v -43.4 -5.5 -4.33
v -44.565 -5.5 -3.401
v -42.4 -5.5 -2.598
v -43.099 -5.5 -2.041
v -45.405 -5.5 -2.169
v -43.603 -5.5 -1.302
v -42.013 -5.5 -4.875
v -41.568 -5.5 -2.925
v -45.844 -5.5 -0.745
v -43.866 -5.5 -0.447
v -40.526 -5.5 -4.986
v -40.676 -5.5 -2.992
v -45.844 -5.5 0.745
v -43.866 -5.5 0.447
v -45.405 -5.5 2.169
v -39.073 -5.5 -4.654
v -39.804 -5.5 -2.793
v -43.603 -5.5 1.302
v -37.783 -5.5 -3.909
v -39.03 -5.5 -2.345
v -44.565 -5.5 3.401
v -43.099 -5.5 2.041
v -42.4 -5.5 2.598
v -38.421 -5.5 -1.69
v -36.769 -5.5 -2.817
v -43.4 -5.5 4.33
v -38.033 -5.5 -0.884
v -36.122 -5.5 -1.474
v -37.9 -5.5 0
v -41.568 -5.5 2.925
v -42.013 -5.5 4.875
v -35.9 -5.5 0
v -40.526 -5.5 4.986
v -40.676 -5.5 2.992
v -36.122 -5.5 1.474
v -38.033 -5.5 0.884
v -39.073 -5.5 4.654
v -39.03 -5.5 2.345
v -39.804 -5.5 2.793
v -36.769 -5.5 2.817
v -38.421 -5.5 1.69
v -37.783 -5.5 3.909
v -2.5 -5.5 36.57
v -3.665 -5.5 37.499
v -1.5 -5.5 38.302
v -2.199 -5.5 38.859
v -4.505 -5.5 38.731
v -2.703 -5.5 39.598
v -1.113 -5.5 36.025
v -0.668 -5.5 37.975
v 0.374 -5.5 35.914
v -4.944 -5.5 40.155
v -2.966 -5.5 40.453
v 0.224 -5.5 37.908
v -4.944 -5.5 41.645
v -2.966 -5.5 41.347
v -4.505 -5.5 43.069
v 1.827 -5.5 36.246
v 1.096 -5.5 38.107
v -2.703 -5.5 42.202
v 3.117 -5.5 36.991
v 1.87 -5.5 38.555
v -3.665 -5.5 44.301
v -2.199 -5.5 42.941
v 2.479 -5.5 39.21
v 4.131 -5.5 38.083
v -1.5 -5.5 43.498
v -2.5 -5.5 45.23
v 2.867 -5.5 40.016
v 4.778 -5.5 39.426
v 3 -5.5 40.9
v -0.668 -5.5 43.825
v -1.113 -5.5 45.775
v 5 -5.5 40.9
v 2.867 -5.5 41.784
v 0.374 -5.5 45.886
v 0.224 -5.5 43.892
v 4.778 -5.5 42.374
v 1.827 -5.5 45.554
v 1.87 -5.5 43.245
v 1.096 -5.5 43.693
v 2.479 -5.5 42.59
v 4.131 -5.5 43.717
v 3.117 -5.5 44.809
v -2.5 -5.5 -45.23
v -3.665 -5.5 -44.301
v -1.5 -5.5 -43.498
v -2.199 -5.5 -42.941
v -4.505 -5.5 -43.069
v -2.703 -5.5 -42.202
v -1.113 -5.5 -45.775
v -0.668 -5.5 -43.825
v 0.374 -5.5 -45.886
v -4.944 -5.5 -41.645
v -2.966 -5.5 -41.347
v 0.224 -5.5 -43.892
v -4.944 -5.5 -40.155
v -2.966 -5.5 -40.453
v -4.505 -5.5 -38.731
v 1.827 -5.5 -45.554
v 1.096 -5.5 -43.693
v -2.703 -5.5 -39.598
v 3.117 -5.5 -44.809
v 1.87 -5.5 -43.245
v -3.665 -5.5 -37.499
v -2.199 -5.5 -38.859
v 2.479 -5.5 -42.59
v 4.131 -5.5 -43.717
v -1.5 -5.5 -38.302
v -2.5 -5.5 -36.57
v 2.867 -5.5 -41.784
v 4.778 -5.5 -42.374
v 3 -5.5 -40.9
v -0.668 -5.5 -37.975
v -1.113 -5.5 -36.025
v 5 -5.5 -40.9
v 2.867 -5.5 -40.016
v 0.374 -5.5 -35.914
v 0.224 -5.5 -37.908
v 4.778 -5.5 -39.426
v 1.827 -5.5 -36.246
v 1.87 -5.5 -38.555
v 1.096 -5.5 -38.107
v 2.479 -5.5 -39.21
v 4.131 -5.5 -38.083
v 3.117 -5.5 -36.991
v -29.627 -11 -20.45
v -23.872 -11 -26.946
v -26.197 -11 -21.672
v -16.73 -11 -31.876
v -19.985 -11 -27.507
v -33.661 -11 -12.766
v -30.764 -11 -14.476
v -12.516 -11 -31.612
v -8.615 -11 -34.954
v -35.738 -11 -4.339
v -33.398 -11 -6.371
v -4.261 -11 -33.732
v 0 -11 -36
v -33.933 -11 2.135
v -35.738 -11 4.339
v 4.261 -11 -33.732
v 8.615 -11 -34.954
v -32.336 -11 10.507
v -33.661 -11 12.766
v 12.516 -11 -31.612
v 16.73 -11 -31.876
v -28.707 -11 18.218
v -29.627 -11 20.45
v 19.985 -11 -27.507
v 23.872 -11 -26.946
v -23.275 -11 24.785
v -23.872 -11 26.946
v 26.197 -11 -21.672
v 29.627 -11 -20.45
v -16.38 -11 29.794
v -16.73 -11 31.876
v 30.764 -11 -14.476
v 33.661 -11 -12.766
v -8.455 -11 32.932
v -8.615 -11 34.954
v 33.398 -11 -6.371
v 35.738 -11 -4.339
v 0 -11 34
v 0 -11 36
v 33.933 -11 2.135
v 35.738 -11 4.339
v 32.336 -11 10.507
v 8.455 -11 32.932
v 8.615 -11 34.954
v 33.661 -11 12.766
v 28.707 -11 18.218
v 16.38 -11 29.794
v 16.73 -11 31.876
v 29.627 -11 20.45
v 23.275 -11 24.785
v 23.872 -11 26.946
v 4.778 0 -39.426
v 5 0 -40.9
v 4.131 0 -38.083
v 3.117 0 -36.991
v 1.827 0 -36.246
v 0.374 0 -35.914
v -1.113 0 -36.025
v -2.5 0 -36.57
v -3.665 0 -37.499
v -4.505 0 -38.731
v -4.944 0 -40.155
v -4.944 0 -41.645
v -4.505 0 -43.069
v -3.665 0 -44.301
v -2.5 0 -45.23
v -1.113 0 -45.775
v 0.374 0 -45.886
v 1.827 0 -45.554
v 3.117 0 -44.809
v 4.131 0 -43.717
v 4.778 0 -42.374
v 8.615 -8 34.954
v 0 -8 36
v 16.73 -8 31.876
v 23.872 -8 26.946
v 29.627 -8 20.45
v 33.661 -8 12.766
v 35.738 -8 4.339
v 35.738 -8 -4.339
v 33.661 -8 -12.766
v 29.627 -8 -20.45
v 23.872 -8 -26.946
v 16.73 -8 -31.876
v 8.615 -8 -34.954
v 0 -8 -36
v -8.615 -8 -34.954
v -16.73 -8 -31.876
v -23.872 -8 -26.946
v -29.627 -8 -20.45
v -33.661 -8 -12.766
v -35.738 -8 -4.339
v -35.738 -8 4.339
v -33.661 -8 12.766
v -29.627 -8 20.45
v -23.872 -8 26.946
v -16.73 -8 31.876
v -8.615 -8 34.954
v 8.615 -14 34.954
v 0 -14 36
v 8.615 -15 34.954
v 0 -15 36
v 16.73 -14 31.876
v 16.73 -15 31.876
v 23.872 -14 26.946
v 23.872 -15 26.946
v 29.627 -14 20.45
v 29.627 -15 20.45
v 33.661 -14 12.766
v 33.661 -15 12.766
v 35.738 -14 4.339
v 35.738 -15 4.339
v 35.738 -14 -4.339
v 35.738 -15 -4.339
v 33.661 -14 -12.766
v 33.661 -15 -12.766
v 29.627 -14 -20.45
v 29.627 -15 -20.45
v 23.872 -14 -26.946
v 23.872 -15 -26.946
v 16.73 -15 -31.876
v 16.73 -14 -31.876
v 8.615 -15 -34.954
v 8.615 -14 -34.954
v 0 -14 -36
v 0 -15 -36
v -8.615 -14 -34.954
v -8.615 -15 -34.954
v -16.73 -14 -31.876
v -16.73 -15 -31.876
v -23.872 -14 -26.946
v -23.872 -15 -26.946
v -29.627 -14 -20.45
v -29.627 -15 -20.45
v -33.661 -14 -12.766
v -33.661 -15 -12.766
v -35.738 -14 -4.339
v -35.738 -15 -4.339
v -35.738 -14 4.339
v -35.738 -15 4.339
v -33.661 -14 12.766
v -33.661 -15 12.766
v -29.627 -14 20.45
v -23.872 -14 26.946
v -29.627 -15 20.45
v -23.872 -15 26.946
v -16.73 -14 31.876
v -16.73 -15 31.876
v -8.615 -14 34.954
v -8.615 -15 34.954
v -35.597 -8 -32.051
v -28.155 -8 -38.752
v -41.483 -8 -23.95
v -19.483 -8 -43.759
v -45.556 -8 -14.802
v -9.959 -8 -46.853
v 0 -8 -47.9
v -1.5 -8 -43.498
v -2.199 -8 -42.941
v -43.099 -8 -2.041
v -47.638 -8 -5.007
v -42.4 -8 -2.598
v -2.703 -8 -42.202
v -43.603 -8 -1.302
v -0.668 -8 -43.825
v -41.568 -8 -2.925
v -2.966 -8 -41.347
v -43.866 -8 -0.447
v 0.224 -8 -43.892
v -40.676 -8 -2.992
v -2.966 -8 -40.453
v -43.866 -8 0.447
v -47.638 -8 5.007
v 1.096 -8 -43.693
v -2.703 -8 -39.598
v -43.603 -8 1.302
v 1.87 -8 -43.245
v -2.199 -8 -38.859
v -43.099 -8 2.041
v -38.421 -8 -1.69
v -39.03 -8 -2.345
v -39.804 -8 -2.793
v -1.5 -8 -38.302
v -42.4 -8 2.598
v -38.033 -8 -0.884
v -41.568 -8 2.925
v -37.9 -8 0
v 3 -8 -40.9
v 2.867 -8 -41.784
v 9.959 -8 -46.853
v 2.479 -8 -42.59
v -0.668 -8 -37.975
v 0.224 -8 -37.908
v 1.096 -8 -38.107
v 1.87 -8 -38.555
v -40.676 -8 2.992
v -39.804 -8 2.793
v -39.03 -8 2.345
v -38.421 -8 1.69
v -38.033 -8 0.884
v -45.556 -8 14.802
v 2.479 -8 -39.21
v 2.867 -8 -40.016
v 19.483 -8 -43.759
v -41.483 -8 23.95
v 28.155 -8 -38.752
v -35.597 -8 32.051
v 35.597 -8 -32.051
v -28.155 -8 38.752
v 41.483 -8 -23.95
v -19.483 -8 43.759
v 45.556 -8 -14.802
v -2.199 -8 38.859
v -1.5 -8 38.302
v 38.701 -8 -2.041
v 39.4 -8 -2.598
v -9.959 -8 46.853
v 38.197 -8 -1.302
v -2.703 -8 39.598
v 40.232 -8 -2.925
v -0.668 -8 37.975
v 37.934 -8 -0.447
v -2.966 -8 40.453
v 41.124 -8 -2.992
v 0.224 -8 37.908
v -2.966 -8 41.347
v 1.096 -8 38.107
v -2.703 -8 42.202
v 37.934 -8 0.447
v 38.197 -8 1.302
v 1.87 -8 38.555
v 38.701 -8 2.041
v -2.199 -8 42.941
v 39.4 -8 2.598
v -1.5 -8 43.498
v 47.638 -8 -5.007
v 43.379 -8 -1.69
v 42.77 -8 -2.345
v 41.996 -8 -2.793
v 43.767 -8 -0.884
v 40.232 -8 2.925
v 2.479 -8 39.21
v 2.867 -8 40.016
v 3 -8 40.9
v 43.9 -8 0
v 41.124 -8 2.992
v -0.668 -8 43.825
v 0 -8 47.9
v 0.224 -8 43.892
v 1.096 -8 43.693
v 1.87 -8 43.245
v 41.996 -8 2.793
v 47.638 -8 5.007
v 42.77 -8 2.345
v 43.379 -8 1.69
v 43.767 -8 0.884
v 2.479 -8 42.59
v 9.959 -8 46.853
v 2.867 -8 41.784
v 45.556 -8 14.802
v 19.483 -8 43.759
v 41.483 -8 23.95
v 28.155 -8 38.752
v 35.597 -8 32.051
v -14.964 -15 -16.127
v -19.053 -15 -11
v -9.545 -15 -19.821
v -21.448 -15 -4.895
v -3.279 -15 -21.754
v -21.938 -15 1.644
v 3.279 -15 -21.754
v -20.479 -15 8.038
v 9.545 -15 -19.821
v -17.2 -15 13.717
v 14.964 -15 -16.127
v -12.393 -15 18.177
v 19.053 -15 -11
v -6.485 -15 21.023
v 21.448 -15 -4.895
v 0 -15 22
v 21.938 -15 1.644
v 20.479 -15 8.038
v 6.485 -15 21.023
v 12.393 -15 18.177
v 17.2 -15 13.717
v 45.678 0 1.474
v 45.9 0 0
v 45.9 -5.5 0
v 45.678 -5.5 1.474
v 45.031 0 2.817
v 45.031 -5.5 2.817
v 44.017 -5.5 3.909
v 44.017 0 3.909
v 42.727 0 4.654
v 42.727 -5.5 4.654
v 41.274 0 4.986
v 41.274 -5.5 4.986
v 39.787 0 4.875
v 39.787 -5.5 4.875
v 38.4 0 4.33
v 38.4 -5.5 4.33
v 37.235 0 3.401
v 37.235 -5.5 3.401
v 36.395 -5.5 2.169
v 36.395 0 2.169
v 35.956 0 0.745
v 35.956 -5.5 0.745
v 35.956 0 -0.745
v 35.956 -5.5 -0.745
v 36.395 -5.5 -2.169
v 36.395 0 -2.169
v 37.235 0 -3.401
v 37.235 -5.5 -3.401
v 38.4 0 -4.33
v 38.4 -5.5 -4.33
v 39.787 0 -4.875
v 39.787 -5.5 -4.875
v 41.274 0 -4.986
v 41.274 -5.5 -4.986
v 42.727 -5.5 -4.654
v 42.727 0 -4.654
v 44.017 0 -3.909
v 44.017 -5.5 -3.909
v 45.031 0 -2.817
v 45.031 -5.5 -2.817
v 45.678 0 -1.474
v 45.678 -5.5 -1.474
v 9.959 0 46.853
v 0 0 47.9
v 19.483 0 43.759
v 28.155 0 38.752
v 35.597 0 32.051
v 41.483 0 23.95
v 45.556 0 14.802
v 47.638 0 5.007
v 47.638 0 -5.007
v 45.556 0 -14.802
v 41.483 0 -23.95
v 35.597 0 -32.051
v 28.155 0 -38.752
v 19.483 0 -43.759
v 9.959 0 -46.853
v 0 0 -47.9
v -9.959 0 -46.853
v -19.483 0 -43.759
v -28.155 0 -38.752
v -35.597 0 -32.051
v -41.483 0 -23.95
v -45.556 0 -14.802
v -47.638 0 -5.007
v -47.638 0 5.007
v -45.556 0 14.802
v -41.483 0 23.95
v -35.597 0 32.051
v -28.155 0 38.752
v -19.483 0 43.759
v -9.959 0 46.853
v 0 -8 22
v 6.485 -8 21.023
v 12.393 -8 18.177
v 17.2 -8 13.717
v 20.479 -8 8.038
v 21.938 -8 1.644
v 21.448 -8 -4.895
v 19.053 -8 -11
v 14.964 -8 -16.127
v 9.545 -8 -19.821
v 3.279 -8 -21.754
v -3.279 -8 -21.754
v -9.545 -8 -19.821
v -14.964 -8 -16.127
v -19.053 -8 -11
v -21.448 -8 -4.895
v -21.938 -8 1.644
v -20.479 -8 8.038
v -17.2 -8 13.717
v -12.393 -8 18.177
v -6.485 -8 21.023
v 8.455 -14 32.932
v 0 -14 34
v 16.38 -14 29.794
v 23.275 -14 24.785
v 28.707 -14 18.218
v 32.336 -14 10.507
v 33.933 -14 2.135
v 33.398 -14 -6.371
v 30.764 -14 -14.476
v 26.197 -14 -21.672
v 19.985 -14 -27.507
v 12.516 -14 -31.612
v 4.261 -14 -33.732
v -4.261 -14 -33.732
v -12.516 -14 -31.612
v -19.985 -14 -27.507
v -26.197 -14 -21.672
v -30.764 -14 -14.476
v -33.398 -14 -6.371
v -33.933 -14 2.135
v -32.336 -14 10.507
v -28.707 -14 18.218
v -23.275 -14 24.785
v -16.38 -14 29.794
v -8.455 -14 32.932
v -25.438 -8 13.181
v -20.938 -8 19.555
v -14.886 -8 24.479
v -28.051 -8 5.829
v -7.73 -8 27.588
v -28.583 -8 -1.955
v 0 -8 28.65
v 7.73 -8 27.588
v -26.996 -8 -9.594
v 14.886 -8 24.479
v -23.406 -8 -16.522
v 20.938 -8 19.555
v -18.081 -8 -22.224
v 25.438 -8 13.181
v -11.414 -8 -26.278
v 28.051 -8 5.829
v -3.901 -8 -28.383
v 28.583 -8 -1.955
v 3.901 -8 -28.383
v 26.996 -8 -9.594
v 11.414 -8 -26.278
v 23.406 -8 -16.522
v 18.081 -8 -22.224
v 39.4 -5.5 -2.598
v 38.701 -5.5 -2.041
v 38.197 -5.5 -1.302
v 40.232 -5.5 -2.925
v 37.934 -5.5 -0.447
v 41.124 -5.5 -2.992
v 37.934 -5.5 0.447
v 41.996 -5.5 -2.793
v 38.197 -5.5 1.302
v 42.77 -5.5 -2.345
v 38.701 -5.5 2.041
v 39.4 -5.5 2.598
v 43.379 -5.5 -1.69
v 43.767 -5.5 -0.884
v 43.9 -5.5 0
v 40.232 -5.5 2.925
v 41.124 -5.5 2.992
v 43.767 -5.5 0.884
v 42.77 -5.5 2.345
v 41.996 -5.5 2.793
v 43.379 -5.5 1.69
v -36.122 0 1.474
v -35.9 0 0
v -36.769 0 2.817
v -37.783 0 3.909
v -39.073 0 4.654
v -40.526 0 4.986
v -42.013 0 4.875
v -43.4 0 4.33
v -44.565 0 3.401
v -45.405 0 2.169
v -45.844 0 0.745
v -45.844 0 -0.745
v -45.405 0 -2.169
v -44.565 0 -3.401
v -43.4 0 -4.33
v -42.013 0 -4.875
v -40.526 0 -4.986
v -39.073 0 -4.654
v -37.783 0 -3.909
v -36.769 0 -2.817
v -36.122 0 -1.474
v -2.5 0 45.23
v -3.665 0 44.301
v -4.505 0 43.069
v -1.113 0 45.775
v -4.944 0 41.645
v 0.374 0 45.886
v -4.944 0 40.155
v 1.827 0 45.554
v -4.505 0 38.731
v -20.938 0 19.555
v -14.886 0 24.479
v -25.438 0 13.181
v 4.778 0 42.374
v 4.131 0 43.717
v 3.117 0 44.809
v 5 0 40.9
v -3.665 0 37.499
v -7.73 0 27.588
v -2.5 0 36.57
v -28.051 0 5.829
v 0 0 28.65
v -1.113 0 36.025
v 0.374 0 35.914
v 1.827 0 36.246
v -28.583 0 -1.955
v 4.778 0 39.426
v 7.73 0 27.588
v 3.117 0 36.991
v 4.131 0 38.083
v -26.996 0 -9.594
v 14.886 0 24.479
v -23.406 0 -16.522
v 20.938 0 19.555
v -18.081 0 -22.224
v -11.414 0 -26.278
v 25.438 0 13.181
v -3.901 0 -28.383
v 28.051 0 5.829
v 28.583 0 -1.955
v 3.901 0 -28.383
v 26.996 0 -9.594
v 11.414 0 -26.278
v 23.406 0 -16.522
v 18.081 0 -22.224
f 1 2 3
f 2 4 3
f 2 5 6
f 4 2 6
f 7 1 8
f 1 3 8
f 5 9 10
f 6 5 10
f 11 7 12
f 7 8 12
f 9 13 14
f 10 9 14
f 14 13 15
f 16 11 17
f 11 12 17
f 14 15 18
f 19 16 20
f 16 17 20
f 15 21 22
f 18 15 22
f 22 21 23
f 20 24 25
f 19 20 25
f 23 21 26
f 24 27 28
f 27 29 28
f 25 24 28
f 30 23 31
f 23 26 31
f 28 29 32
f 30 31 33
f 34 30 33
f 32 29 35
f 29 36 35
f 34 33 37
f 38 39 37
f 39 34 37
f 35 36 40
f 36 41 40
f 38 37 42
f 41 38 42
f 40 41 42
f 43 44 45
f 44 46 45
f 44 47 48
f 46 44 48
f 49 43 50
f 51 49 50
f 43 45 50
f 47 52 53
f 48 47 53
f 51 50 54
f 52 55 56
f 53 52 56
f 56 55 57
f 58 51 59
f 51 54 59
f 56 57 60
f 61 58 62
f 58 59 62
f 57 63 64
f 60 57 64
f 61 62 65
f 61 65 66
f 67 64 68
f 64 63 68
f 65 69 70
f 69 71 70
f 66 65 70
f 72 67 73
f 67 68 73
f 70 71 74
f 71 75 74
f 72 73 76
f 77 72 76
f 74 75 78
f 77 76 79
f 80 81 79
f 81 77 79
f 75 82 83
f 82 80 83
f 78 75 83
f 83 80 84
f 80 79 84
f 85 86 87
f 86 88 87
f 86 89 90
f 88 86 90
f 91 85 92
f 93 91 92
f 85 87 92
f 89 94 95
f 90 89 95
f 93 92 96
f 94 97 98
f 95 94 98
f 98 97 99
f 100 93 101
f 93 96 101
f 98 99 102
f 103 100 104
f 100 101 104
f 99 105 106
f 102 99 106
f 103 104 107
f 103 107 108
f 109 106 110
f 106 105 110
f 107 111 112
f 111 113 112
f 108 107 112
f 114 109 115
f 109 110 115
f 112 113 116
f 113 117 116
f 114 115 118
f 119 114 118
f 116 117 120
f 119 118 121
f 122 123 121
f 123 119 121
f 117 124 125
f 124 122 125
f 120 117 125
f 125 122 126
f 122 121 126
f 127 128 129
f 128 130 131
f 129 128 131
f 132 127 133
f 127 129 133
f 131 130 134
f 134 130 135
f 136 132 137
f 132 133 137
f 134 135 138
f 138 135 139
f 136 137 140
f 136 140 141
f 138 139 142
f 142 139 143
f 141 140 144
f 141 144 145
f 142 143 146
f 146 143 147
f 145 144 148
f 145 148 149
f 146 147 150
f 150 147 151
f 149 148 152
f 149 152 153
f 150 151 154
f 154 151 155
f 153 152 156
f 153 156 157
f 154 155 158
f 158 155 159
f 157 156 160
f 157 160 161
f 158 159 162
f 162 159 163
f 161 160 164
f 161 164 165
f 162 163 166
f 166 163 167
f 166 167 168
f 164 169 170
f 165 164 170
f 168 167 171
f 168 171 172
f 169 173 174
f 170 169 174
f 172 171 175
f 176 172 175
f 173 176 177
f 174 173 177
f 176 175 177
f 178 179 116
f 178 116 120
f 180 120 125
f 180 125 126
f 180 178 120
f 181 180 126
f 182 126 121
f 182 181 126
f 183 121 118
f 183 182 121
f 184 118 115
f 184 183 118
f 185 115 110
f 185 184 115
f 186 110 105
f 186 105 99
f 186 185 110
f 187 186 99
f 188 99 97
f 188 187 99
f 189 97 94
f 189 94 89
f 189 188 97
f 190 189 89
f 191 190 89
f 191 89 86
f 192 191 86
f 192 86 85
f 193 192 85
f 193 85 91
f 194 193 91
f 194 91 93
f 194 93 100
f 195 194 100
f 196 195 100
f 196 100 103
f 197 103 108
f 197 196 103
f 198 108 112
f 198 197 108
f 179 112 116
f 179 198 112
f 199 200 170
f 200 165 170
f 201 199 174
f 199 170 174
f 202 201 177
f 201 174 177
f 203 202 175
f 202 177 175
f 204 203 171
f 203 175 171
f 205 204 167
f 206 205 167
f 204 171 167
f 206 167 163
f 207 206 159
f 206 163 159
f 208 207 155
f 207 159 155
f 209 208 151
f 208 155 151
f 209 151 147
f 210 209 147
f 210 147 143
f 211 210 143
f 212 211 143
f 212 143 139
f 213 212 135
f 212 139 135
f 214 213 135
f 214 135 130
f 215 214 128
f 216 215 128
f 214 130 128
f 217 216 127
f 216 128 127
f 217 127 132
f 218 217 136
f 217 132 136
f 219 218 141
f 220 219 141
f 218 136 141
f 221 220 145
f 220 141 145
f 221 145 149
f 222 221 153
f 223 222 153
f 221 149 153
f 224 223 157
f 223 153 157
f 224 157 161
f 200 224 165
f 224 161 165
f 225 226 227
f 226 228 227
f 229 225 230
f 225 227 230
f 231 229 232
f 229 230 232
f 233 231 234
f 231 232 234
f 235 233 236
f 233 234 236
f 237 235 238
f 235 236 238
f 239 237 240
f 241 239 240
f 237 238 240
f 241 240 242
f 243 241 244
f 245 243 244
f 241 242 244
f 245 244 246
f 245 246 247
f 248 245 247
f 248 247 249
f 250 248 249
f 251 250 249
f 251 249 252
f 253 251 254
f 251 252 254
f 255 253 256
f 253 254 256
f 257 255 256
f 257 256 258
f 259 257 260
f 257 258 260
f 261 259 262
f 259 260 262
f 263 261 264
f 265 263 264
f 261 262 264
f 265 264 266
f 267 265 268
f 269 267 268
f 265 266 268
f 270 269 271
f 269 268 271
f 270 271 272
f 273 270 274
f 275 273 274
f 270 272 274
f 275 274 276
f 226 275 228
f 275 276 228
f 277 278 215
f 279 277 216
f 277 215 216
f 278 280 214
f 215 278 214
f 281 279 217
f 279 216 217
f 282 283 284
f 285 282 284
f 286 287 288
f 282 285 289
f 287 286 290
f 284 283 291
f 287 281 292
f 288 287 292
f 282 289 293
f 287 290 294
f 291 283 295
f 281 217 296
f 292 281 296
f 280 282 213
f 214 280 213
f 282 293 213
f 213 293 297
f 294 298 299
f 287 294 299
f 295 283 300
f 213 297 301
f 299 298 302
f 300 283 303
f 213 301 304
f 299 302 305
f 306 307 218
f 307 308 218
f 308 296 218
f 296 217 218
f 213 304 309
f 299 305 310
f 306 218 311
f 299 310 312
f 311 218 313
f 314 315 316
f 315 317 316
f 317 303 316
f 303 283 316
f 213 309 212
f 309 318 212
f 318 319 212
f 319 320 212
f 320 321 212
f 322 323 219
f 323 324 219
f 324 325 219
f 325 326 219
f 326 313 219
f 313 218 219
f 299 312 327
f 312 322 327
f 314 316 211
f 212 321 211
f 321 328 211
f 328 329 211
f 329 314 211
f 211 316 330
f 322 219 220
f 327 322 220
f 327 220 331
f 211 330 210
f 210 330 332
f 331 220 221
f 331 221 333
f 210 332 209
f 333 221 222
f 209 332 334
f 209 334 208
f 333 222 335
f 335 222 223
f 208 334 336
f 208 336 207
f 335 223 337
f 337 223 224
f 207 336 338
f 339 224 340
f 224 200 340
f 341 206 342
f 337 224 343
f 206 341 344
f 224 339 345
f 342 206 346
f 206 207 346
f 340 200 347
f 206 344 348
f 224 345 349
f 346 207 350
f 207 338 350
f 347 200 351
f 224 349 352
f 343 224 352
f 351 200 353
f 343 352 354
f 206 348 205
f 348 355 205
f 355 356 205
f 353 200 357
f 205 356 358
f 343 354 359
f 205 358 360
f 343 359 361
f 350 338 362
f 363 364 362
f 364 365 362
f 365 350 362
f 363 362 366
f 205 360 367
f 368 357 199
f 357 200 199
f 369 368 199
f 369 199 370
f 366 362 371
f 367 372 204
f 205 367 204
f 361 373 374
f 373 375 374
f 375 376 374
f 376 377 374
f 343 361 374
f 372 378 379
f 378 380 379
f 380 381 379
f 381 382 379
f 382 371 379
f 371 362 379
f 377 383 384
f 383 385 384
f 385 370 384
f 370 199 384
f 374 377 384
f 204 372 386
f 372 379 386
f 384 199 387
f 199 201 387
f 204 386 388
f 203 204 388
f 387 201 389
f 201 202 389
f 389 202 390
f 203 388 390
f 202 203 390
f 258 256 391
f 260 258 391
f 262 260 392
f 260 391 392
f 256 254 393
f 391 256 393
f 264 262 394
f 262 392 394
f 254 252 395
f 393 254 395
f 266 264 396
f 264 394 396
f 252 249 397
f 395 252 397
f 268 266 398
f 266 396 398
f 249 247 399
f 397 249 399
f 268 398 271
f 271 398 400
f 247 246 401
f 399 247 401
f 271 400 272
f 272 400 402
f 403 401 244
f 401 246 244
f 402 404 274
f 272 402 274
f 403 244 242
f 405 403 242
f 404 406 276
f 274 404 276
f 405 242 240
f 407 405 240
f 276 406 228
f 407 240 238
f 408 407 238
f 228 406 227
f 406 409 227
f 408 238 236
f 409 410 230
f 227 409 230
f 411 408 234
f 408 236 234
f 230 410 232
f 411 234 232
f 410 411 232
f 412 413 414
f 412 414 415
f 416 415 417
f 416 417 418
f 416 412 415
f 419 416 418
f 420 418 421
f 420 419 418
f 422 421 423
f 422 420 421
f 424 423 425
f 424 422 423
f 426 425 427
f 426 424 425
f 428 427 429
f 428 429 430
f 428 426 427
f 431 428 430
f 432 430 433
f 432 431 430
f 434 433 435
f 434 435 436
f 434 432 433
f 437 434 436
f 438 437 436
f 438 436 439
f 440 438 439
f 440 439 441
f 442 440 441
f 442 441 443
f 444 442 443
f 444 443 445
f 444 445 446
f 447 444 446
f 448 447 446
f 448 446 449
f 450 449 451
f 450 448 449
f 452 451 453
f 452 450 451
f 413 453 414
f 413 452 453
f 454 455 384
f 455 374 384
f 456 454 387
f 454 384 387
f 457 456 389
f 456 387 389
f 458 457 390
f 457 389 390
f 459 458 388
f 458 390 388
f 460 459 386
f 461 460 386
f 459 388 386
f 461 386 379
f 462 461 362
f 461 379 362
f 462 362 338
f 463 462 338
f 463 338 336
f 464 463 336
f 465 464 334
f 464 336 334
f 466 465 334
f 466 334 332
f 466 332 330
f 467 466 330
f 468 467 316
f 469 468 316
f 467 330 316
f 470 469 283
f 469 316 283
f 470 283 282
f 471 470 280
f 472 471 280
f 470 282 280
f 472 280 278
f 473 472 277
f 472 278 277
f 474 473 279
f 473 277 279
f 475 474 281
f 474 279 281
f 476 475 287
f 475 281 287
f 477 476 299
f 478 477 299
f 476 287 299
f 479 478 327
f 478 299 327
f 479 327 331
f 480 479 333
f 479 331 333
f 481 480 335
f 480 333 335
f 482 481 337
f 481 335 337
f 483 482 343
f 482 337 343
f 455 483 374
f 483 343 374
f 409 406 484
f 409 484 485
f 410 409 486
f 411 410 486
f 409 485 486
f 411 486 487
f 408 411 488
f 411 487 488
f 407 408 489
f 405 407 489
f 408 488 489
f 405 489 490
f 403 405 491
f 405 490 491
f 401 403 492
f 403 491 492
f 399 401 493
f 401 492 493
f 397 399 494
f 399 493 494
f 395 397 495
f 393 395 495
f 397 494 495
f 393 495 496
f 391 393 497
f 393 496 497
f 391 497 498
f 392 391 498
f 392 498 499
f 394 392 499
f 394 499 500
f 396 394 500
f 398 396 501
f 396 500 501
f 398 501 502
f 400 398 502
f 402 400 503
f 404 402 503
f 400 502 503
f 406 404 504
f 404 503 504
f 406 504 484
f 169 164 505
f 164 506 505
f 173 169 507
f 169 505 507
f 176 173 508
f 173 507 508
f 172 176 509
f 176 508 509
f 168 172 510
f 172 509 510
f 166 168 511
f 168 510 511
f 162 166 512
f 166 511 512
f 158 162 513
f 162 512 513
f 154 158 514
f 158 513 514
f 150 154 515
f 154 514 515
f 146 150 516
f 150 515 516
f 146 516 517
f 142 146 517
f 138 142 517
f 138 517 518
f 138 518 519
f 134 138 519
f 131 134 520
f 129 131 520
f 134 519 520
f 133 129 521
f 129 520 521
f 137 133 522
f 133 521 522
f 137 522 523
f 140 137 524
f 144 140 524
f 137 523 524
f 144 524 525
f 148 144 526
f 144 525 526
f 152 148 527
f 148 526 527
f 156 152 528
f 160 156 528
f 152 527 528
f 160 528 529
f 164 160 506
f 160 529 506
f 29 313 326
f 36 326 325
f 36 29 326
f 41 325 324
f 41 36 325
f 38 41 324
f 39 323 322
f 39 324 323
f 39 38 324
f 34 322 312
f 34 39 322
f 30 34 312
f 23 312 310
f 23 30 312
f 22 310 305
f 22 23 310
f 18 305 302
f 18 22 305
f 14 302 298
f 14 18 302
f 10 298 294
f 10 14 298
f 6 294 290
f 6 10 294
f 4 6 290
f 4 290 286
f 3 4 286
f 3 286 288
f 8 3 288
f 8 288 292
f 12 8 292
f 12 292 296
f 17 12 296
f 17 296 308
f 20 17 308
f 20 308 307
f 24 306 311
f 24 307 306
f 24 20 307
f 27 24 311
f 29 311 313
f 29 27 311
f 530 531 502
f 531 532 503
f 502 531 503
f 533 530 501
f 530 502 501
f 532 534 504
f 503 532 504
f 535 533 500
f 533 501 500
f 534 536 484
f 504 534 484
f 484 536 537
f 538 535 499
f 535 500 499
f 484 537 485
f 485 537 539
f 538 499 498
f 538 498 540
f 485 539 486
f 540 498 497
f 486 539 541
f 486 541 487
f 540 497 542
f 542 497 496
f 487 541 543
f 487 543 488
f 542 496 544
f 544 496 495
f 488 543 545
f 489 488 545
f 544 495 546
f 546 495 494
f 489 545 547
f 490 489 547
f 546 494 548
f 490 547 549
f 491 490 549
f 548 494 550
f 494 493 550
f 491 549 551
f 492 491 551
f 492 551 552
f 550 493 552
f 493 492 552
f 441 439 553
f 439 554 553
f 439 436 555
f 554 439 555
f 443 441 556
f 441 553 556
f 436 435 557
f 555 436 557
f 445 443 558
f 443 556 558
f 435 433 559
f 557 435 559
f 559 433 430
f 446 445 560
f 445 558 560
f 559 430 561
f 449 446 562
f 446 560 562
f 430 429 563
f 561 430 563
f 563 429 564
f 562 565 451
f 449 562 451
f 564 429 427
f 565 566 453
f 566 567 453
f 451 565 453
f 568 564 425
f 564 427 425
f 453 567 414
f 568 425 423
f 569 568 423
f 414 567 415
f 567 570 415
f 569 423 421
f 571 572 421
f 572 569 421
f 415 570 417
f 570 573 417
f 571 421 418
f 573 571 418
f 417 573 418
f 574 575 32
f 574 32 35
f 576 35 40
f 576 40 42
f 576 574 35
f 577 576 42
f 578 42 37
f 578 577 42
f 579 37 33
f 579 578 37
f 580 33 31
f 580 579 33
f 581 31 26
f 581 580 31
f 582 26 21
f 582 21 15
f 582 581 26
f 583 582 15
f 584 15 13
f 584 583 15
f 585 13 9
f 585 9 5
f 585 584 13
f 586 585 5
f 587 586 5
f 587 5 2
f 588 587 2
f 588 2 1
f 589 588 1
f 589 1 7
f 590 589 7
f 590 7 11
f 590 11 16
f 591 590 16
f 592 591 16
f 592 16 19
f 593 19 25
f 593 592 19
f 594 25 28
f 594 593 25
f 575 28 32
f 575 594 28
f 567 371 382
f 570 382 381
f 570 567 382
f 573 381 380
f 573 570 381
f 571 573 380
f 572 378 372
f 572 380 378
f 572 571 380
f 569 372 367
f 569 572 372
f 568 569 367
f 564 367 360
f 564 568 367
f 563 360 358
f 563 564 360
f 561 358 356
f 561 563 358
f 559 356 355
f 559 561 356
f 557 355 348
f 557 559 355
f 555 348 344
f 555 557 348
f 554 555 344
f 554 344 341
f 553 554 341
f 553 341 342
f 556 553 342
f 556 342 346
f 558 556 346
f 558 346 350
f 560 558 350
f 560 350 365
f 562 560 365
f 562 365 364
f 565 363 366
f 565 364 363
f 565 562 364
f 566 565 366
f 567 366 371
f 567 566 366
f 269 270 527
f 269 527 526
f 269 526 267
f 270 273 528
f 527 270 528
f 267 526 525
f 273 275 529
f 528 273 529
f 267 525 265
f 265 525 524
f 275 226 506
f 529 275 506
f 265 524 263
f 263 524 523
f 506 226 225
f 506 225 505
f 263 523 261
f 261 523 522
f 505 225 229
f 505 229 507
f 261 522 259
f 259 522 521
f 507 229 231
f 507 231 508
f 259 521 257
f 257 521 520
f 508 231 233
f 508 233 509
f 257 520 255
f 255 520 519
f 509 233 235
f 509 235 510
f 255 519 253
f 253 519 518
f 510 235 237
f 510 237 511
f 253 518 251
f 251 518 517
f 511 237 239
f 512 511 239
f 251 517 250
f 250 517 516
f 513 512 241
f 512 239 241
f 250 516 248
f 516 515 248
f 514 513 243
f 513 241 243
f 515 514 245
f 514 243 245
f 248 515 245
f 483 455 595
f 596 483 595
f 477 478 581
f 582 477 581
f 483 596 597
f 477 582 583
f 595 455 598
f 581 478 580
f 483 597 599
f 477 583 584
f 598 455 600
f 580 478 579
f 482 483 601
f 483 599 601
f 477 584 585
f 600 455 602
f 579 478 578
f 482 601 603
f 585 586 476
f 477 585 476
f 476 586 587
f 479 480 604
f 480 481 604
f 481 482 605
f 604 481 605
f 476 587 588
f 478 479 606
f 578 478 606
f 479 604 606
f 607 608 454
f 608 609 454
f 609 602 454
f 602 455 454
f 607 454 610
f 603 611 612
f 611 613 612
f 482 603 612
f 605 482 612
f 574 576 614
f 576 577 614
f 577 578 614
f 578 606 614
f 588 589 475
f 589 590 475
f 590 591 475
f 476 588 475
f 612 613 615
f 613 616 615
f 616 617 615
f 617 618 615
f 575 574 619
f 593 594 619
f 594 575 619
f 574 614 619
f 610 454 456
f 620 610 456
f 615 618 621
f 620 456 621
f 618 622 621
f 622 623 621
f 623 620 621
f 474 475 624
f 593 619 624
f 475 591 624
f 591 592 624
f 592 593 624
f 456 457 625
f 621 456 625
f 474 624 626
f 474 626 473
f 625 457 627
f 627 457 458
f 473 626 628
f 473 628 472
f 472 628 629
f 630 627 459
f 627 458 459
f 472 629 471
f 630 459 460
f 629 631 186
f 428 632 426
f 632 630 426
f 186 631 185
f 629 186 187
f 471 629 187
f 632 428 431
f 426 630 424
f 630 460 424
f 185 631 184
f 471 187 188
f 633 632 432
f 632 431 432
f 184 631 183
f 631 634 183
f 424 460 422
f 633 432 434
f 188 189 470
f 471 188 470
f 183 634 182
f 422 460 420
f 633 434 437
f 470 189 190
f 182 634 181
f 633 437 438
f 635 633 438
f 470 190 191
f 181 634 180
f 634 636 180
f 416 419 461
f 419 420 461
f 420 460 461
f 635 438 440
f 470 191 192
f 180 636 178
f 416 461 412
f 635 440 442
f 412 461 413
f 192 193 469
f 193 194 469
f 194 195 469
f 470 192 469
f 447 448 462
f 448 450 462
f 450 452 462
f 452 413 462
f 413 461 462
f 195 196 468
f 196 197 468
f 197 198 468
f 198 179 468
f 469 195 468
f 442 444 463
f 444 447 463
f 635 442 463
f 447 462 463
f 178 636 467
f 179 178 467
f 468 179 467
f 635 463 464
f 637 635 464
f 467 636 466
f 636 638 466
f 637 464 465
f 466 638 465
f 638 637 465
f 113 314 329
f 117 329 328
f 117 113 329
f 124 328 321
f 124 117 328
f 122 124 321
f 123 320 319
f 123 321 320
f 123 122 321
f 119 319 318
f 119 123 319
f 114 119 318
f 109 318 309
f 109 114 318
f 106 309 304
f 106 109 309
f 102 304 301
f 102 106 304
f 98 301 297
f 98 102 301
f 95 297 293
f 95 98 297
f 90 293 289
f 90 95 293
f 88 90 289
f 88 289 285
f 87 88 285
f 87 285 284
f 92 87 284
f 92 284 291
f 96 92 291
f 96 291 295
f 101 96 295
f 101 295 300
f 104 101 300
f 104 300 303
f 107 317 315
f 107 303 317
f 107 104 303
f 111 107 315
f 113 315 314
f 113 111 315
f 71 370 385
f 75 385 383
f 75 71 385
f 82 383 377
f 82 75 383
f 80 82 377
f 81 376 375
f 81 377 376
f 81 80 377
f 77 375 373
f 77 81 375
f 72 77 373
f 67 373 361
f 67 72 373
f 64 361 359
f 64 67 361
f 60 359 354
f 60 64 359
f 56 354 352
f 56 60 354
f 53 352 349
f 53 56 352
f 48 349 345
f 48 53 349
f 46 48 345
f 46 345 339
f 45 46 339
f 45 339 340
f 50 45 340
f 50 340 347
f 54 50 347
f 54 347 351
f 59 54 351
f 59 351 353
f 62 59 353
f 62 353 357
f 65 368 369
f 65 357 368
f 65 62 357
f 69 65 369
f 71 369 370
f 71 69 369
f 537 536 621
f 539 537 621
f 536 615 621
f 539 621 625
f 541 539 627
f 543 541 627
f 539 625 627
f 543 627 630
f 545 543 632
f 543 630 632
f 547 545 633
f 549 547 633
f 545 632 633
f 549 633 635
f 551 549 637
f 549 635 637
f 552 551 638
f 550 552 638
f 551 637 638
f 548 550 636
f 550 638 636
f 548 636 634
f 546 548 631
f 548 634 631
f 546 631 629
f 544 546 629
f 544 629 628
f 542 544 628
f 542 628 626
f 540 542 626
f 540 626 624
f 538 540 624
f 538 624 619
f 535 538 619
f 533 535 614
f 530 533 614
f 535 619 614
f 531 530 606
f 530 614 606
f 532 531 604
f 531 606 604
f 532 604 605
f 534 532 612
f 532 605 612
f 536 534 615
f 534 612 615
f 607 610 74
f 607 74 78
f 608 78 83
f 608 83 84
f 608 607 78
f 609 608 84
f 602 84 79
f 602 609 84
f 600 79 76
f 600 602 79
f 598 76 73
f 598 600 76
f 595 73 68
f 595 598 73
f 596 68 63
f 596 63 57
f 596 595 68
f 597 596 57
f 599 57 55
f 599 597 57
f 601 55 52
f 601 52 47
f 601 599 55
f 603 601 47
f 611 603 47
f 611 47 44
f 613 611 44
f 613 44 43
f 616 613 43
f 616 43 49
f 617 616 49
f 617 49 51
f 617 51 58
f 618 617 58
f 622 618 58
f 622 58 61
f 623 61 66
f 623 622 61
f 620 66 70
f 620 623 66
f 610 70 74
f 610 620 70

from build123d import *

# Parameters (mm, degrees)
F2_R     = 5
F2_R_2   = 3
F3_DEPTH = 5.5
F4_DEPTH = 25


with BuildPart() as f1:
    # F0 (on Right) → F1 (revolve)
    with BuildSketch(Plane.YZ):
        Polygon((-8, 28.65), (0, 28.65), (0, 47.9), (-8, 47.9), (-8, 36), (-11, 36), (-11, 34), (-14, 34), (-14, 36), (-15, 36), (-15, 22), (-8, 22), align=None)
    revolve(axis=Axis((0, 0.8244532039, 0), (0, 1, 0)))

    # F2 (on Front) → F3 (cut)
    with BuildSketch(Plane.XZ):
        with Locations((0, 40.9)):
            Circle(F2_R)
        with Locations((0, 40.9)):
            Circle(F2_R_2, mode=Mode.SUBTRACT)
        with Locations((-40.9, 0)):
            Circle(F2_R)
        with Locations((-40.9, 0)):
            Circle(F2_R_2, mode=Mode.SUBTRACT)
        with Locations((40.9, 0)):
            Circle(F2_R)
        with Locations((40.9, 0)):
            Circle(F2_R_2, mode=Mode.SUBTRACT)
        with Locations((0, -40.9)):
            Circle(F2_R)
        with Locations((0, -40.9)):
            Circle(F2_R_2, mode=Mode.SUBTRACT)
    extrude(amount=F3_DEPTH, mode=Mode.SUBTRACT)

    # F4 (cut): faces of the model
    f4_faces = [f1.faces().sort_by_distance(p)[0] for p in [
        (-40.9, 0, 0),
        (0, 0, 40.9),
        (40.9, 0, 0),
        (0, 0, -40.9),
    ]]
    extrude(f4_faces, amount=-F4_DEPTH, mode=Mode.SUBTRACT)


solid = f1.part
